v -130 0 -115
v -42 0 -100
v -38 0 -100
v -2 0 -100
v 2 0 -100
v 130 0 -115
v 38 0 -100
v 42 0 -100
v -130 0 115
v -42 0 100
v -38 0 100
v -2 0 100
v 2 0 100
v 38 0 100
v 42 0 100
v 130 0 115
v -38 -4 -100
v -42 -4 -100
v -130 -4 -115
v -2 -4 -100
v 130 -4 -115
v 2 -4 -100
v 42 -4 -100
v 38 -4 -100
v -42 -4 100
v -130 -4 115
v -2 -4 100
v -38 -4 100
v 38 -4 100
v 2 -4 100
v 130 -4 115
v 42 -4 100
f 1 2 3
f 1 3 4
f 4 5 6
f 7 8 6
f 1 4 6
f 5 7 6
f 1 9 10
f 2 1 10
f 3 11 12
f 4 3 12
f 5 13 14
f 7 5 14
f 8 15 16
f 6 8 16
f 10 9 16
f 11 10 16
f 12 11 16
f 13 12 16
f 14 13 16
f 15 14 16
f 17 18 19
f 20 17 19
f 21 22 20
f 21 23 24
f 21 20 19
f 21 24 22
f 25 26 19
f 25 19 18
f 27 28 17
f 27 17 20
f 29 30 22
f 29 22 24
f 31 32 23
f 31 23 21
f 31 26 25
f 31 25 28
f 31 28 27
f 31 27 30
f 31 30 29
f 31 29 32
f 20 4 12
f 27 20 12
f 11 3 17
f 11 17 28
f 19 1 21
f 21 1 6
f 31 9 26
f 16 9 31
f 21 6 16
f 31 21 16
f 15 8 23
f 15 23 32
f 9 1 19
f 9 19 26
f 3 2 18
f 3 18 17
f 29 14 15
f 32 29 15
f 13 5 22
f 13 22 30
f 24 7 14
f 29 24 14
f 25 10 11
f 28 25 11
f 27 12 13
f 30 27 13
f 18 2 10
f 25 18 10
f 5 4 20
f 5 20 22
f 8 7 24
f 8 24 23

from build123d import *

# Parameters (mm, degrees)
F0_W     = 260
F0_H     = 230
F0_W_2   = 4
F0_H_2   = 200
F1_DEPTH = 4


with BuildPart() as f1:
    # F0 (on Front) → F1 (new body)
    with BuildSketch(Plane.XZ):
        Rectangle(F0_W, F0_H)
        with Locations((-40, 0)):
            Rectangle(F0_W_2, F0_H_2, mode=Mode.SUBTRACT)
        Rectangle(F0_W_2, F0_H_2, mode=Mode.SUBTRACT)
        with Locations((40, 0)):
            Rectangle(F0_W_2, F0_H_2, mode=Mode.SUBTRACT)
    extrude(amount=F1_DEPTH)


solid = f1.part
